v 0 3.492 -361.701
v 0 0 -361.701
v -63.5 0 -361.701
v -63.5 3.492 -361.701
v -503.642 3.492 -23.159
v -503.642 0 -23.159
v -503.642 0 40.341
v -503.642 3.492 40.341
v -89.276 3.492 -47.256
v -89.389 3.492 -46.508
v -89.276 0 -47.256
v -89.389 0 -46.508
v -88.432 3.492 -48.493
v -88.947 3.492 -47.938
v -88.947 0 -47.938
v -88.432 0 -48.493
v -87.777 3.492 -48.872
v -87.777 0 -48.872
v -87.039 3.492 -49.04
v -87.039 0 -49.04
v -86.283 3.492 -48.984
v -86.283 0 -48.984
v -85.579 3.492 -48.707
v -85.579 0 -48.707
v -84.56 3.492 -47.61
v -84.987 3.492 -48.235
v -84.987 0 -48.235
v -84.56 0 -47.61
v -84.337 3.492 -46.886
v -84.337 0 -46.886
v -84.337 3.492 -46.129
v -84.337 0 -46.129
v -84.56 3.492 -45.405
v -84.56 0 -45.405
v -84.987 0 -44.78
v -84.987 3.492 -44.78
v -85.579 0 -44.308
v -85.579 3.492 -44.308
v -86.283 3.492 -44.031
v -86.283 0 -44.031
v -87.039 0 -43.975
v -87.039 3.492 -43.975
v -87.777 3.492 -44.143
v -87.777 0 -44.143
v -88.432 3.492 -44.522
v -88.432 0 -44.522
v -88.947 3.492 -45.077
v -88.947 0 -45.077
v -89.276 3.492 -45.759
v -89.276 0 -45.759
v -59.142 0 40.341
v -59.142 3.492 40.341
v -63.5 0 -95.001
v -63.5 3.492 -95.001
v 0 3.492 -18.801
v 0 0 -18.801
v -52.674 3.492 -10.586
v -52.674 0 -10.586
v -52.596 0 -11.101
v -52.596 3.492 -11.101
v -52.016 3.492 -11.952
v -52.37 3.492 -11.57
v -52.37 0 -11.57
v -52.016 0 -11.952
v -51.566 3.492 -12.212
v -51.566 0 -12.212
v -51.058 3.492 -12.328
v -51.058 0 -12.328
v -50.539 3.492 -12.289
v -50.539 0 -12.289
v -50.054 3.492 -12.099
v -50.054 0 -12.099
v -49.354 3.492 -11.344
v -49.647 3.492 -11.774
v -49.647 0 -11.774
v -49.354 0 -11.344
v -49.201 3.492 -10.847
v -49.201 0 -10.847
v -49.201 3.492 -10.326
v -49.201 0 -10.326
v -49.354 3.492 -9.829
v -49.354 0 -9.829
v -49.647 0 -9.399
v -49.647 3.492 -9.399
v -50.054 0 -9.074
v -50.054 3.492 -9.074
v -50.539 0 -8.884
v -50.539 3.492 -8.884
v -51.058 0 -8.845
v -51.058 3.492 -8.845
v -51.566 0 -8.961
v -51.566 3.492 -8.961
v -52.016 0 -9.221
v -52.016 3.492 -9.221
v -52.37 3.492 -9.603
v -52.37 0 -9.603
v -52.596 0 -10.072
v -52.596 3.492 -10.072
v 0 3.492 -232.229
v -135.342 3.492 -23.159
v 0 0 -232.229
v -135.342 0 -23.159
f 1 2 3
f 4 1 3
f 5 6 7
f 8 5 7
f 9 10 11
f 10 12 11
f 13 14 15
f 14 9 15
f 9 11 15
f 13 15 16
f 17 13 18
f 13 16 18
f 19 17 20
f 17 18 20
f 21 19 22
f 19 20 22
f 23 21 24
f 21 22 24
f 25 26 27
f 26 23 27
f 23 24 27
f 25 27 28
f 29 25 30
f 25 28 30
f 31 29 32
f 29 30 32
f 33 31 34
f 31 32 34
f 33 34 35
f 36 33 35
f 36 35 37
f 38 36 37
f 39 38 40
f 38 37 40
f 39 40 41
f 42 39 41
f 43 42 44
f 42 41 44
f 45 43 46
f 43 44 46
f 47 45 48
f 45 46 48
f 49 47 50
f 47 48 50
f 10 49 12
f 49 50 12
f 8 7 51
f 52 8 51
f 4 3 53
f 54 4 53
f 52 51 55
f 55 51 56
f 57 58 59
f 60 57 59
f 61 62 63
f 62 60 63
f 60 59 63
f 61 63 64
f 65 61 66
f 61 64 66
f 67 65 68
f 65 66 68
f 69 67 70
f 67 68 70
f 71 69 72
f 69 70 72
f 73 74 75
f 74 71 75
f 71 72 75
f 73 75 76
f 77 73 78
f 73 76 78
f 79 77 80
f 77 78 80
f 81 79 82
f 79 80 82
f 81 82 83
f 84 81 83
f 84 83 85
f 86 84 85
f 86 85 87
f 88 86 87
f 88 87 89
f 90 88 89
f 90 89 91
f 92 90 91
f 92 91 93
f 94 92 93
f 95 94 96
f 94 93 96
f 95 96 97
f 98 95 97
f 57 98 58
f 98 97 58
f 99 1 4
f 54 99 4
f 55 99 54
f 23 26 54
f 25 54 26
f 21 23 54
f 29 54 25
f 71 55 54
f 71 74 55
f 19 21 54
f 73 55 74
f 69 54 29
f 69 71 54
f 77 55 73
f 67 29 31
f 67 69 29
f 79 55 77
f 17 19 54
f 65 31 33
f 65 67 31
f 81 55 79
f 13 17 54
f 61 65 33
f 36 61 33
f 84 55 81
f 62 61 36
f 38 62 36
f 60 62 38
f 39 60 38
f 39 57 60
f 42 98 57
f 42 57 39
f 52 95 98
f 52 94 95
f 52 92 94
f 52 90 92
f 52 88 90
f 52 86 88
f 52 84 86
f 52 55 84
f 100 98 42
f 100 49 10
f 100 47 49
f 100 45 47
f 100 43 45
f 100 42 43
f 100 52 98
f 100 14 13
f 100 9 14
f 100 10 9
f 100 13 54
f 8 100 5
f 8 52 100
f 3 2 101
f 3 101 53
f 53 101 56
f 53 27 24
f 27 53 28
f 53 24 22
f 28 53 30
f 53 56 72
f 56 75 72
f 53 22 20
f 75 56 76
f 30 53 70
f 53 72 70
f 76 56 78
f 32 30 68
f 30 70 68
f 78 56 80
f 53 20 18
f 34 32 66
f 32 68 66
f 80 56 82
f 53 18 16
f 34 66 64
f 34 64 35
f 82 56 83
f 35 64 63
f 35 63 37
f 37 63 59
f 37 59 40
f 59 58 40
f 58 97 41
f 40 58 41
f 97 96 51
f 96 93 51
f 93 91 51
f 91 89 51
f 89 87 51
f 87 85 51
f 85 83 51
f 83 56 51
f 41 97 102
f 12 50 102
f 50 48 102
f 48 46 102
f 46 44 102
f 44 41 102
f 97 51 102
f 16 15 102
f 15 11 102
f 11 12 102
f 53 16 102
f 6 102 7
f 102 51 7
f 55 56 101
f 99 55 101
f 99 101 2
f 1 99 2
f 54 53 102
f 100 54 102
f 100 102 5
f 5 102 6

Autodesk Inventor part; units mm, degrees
ref_plane "YZ Plane" through (0, 0, 0) normal (1, 0, 0) x (0, 1, 0)
ref_plane "XZ Plane" through (0, 0, 0) normal (0, 1, 0) x (-1, 0, 0)
ref_plane "XY Plane" through (0, 0, 0) normal (0, 0, 1) x (1, 0, 0)
sketch "Sketch1" plane through (0, 0, 0) normal (0, 1, 0) x (-1, 0, 0)
  line L0 (0, -232.2291) -> (0, -361.7009)
  line L1 (0, -361.7009) -> (63.5, -361.7009)
  line L2 (63.5, -361.7009) -> (63.5, -95.0009)
  line L3 (63.5, -95.0009) -> (135.342, -23.1589)
  line L4 (135.342, -23.1589) -> (503.642, -23.1589)
  line L5 (503.642, -23.1589) -> (503.642, 40.3411)
  line L6 (503.642, 40.3411) -> (59.142, 40.3411)
  line L7 (59.142, 40.3411) -> (0, -18.8009)
  line L8 (0, -18.8009) -> (0, -232.2291)
  line L9 (99.421, -59.0799) -> (29.571, 10.7701) construction
  circle A0 centre (86.8487, -46.5075) radius 2.54
  circle A1 centre (50.9276, -10.5865) radius 1.7463
  point P0 (0, 0)
  dimension "d0" = 63.5
  dimension "d2" = 63.5
  dimension "d3" = 101.6
  dimension "d4" = 266.7
  dimension "d5" = 368.3
  dimension "d6" = 342.9
  dimension "d7" = 444.5
  dimension "d10" = 5.08
  dimension "d11" = 17.78
  dimension "d12" = 3.4925
  dimension "d13" = 68.58
extrude "Extrusion1" add sketch "Sketch1" along normal blind 3.4925
properties part number "OptiTrack_Calibrator"
